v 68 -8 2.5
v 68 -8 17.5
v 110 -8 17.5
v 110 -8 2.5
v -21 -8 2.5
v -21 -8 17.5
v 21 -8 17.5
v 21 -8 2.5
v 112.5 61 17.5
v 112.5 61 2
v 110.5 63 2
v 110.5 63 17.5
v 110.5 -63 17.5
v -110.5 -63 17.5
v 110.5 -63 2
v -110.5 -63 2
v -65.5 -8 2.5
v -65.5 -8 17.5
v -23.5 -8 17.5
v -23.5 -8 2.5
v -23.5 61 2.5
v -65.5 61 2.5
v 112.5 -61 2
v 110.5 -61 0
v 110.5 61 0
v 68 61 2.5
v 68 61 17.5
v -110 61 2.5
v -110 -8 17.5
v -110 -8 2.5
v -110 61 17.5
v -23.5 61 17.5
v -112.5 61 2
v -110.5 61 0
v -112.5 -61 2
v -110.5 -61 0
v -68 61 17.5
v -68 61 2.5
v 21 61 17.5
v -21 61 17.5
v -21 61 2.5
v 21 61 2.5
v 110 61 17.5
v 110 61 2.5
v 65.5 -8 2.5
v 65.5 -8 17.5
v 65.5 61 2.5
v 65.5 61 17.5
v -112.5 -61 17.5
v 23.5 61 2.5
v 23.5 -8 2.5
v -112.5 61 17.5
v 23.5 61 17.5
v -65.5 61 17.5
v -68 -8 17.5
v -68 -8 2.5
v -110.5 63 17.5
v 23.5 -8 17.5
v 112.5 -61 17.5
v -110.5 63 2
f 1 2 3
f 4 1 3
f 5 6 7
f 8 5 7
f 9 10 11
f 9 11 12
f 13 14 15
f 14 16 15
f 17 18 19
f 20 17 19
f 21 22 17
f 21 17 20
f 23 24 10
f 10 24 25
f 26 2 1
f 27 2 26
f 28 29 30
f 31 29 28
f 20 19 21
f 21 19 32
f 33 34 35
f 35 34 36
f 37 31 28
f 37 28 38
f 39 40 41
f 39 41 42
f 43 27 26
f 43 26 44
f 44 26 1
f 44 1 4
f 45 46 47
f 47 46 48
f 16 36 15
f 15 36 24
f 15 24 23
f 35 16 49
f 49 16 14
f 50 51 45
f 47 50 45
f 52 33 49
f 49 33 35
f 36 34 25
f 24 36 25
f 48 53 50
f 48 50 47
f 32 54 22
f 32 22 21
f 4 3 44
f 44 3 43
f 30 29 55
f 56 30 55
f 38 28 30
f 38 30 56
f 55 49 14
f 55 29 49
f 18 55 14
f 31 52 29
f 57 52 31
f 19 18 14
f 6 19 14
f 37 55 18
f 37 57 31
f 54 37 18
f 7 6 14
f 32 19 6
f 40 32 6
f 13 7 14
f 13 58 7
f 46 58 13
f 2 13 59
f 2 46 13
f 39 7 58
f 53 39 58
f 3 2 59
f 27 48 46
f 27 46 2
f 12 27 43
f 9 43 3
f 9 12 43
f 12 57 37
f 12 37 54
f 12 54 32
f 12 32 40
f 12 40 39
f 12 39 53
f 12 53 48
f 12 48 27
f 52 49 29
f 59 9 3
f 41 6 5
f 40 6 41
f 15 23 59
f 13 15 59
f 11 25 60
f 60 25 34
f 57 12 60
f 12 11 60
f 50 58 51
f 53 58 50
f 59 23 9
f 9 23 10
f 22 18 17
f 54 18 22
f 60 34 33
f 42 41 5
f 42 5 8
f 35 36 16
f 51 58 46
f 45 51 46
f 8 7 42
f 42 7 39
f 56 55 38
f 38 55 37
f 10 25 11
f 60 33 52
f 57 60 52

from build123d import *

# Parameters (mm, degrees)
F1_DEPTH = 17.5
F2_SIZE  = 2
F3_W     = 42
F3_H     = 69
F4_DEPTH = 15


with BuildPart() as f1:
    # F0 (on Top) → F1 (new body)
    with BuildSketch(Plane.XY):
        Polygon((112.5, 63), (0, 63), (-112.5, 63), (-112.5, 0), (-112.5, -63), (0, -63), (112.5, -63), (112.5, 0), align=None)
    extrude(amount=F1_DEPTH)

    # F2
    f2_edges = [f1.edges().sort_by_distance(p)[0] for p in [
        (-112.5, 0, 0),
        (0, -63, 0),
        (112.5, 0, 0),
        (0, 63, 0),
        (-112.5, -63, 8.75),
        (112.5, -63, 8.75),
        (112.5, 63, 8.75),
        (-112.5, 63, 8.75),
    ]]
    chamfer(f2_edges, length=F2_SIZE)

    # F3 (on face) → F4 (cut)
    with BuildSketch(Plane.XY.offset(17.5)):
        with Locations((89, 26.5)):
            Rectangle(F3_W, F3_H)
        with Locations((44.5, 26.5)):
            Rectangle(F3_W, F3_H)
        with Locations((0, 26.5)):
            Rectangle(F3_W, F3_H)
        with Locations((-44.5, 26.5)):
            Rectangle(F3_W, F3_H)
        with Locations((-89, 26.5)):
            Rectangle(F3_W, F3_H)
    extrude(amount=-F4_DEPTH, mode=Mode.SUBTRACT)


solid = f1.part
